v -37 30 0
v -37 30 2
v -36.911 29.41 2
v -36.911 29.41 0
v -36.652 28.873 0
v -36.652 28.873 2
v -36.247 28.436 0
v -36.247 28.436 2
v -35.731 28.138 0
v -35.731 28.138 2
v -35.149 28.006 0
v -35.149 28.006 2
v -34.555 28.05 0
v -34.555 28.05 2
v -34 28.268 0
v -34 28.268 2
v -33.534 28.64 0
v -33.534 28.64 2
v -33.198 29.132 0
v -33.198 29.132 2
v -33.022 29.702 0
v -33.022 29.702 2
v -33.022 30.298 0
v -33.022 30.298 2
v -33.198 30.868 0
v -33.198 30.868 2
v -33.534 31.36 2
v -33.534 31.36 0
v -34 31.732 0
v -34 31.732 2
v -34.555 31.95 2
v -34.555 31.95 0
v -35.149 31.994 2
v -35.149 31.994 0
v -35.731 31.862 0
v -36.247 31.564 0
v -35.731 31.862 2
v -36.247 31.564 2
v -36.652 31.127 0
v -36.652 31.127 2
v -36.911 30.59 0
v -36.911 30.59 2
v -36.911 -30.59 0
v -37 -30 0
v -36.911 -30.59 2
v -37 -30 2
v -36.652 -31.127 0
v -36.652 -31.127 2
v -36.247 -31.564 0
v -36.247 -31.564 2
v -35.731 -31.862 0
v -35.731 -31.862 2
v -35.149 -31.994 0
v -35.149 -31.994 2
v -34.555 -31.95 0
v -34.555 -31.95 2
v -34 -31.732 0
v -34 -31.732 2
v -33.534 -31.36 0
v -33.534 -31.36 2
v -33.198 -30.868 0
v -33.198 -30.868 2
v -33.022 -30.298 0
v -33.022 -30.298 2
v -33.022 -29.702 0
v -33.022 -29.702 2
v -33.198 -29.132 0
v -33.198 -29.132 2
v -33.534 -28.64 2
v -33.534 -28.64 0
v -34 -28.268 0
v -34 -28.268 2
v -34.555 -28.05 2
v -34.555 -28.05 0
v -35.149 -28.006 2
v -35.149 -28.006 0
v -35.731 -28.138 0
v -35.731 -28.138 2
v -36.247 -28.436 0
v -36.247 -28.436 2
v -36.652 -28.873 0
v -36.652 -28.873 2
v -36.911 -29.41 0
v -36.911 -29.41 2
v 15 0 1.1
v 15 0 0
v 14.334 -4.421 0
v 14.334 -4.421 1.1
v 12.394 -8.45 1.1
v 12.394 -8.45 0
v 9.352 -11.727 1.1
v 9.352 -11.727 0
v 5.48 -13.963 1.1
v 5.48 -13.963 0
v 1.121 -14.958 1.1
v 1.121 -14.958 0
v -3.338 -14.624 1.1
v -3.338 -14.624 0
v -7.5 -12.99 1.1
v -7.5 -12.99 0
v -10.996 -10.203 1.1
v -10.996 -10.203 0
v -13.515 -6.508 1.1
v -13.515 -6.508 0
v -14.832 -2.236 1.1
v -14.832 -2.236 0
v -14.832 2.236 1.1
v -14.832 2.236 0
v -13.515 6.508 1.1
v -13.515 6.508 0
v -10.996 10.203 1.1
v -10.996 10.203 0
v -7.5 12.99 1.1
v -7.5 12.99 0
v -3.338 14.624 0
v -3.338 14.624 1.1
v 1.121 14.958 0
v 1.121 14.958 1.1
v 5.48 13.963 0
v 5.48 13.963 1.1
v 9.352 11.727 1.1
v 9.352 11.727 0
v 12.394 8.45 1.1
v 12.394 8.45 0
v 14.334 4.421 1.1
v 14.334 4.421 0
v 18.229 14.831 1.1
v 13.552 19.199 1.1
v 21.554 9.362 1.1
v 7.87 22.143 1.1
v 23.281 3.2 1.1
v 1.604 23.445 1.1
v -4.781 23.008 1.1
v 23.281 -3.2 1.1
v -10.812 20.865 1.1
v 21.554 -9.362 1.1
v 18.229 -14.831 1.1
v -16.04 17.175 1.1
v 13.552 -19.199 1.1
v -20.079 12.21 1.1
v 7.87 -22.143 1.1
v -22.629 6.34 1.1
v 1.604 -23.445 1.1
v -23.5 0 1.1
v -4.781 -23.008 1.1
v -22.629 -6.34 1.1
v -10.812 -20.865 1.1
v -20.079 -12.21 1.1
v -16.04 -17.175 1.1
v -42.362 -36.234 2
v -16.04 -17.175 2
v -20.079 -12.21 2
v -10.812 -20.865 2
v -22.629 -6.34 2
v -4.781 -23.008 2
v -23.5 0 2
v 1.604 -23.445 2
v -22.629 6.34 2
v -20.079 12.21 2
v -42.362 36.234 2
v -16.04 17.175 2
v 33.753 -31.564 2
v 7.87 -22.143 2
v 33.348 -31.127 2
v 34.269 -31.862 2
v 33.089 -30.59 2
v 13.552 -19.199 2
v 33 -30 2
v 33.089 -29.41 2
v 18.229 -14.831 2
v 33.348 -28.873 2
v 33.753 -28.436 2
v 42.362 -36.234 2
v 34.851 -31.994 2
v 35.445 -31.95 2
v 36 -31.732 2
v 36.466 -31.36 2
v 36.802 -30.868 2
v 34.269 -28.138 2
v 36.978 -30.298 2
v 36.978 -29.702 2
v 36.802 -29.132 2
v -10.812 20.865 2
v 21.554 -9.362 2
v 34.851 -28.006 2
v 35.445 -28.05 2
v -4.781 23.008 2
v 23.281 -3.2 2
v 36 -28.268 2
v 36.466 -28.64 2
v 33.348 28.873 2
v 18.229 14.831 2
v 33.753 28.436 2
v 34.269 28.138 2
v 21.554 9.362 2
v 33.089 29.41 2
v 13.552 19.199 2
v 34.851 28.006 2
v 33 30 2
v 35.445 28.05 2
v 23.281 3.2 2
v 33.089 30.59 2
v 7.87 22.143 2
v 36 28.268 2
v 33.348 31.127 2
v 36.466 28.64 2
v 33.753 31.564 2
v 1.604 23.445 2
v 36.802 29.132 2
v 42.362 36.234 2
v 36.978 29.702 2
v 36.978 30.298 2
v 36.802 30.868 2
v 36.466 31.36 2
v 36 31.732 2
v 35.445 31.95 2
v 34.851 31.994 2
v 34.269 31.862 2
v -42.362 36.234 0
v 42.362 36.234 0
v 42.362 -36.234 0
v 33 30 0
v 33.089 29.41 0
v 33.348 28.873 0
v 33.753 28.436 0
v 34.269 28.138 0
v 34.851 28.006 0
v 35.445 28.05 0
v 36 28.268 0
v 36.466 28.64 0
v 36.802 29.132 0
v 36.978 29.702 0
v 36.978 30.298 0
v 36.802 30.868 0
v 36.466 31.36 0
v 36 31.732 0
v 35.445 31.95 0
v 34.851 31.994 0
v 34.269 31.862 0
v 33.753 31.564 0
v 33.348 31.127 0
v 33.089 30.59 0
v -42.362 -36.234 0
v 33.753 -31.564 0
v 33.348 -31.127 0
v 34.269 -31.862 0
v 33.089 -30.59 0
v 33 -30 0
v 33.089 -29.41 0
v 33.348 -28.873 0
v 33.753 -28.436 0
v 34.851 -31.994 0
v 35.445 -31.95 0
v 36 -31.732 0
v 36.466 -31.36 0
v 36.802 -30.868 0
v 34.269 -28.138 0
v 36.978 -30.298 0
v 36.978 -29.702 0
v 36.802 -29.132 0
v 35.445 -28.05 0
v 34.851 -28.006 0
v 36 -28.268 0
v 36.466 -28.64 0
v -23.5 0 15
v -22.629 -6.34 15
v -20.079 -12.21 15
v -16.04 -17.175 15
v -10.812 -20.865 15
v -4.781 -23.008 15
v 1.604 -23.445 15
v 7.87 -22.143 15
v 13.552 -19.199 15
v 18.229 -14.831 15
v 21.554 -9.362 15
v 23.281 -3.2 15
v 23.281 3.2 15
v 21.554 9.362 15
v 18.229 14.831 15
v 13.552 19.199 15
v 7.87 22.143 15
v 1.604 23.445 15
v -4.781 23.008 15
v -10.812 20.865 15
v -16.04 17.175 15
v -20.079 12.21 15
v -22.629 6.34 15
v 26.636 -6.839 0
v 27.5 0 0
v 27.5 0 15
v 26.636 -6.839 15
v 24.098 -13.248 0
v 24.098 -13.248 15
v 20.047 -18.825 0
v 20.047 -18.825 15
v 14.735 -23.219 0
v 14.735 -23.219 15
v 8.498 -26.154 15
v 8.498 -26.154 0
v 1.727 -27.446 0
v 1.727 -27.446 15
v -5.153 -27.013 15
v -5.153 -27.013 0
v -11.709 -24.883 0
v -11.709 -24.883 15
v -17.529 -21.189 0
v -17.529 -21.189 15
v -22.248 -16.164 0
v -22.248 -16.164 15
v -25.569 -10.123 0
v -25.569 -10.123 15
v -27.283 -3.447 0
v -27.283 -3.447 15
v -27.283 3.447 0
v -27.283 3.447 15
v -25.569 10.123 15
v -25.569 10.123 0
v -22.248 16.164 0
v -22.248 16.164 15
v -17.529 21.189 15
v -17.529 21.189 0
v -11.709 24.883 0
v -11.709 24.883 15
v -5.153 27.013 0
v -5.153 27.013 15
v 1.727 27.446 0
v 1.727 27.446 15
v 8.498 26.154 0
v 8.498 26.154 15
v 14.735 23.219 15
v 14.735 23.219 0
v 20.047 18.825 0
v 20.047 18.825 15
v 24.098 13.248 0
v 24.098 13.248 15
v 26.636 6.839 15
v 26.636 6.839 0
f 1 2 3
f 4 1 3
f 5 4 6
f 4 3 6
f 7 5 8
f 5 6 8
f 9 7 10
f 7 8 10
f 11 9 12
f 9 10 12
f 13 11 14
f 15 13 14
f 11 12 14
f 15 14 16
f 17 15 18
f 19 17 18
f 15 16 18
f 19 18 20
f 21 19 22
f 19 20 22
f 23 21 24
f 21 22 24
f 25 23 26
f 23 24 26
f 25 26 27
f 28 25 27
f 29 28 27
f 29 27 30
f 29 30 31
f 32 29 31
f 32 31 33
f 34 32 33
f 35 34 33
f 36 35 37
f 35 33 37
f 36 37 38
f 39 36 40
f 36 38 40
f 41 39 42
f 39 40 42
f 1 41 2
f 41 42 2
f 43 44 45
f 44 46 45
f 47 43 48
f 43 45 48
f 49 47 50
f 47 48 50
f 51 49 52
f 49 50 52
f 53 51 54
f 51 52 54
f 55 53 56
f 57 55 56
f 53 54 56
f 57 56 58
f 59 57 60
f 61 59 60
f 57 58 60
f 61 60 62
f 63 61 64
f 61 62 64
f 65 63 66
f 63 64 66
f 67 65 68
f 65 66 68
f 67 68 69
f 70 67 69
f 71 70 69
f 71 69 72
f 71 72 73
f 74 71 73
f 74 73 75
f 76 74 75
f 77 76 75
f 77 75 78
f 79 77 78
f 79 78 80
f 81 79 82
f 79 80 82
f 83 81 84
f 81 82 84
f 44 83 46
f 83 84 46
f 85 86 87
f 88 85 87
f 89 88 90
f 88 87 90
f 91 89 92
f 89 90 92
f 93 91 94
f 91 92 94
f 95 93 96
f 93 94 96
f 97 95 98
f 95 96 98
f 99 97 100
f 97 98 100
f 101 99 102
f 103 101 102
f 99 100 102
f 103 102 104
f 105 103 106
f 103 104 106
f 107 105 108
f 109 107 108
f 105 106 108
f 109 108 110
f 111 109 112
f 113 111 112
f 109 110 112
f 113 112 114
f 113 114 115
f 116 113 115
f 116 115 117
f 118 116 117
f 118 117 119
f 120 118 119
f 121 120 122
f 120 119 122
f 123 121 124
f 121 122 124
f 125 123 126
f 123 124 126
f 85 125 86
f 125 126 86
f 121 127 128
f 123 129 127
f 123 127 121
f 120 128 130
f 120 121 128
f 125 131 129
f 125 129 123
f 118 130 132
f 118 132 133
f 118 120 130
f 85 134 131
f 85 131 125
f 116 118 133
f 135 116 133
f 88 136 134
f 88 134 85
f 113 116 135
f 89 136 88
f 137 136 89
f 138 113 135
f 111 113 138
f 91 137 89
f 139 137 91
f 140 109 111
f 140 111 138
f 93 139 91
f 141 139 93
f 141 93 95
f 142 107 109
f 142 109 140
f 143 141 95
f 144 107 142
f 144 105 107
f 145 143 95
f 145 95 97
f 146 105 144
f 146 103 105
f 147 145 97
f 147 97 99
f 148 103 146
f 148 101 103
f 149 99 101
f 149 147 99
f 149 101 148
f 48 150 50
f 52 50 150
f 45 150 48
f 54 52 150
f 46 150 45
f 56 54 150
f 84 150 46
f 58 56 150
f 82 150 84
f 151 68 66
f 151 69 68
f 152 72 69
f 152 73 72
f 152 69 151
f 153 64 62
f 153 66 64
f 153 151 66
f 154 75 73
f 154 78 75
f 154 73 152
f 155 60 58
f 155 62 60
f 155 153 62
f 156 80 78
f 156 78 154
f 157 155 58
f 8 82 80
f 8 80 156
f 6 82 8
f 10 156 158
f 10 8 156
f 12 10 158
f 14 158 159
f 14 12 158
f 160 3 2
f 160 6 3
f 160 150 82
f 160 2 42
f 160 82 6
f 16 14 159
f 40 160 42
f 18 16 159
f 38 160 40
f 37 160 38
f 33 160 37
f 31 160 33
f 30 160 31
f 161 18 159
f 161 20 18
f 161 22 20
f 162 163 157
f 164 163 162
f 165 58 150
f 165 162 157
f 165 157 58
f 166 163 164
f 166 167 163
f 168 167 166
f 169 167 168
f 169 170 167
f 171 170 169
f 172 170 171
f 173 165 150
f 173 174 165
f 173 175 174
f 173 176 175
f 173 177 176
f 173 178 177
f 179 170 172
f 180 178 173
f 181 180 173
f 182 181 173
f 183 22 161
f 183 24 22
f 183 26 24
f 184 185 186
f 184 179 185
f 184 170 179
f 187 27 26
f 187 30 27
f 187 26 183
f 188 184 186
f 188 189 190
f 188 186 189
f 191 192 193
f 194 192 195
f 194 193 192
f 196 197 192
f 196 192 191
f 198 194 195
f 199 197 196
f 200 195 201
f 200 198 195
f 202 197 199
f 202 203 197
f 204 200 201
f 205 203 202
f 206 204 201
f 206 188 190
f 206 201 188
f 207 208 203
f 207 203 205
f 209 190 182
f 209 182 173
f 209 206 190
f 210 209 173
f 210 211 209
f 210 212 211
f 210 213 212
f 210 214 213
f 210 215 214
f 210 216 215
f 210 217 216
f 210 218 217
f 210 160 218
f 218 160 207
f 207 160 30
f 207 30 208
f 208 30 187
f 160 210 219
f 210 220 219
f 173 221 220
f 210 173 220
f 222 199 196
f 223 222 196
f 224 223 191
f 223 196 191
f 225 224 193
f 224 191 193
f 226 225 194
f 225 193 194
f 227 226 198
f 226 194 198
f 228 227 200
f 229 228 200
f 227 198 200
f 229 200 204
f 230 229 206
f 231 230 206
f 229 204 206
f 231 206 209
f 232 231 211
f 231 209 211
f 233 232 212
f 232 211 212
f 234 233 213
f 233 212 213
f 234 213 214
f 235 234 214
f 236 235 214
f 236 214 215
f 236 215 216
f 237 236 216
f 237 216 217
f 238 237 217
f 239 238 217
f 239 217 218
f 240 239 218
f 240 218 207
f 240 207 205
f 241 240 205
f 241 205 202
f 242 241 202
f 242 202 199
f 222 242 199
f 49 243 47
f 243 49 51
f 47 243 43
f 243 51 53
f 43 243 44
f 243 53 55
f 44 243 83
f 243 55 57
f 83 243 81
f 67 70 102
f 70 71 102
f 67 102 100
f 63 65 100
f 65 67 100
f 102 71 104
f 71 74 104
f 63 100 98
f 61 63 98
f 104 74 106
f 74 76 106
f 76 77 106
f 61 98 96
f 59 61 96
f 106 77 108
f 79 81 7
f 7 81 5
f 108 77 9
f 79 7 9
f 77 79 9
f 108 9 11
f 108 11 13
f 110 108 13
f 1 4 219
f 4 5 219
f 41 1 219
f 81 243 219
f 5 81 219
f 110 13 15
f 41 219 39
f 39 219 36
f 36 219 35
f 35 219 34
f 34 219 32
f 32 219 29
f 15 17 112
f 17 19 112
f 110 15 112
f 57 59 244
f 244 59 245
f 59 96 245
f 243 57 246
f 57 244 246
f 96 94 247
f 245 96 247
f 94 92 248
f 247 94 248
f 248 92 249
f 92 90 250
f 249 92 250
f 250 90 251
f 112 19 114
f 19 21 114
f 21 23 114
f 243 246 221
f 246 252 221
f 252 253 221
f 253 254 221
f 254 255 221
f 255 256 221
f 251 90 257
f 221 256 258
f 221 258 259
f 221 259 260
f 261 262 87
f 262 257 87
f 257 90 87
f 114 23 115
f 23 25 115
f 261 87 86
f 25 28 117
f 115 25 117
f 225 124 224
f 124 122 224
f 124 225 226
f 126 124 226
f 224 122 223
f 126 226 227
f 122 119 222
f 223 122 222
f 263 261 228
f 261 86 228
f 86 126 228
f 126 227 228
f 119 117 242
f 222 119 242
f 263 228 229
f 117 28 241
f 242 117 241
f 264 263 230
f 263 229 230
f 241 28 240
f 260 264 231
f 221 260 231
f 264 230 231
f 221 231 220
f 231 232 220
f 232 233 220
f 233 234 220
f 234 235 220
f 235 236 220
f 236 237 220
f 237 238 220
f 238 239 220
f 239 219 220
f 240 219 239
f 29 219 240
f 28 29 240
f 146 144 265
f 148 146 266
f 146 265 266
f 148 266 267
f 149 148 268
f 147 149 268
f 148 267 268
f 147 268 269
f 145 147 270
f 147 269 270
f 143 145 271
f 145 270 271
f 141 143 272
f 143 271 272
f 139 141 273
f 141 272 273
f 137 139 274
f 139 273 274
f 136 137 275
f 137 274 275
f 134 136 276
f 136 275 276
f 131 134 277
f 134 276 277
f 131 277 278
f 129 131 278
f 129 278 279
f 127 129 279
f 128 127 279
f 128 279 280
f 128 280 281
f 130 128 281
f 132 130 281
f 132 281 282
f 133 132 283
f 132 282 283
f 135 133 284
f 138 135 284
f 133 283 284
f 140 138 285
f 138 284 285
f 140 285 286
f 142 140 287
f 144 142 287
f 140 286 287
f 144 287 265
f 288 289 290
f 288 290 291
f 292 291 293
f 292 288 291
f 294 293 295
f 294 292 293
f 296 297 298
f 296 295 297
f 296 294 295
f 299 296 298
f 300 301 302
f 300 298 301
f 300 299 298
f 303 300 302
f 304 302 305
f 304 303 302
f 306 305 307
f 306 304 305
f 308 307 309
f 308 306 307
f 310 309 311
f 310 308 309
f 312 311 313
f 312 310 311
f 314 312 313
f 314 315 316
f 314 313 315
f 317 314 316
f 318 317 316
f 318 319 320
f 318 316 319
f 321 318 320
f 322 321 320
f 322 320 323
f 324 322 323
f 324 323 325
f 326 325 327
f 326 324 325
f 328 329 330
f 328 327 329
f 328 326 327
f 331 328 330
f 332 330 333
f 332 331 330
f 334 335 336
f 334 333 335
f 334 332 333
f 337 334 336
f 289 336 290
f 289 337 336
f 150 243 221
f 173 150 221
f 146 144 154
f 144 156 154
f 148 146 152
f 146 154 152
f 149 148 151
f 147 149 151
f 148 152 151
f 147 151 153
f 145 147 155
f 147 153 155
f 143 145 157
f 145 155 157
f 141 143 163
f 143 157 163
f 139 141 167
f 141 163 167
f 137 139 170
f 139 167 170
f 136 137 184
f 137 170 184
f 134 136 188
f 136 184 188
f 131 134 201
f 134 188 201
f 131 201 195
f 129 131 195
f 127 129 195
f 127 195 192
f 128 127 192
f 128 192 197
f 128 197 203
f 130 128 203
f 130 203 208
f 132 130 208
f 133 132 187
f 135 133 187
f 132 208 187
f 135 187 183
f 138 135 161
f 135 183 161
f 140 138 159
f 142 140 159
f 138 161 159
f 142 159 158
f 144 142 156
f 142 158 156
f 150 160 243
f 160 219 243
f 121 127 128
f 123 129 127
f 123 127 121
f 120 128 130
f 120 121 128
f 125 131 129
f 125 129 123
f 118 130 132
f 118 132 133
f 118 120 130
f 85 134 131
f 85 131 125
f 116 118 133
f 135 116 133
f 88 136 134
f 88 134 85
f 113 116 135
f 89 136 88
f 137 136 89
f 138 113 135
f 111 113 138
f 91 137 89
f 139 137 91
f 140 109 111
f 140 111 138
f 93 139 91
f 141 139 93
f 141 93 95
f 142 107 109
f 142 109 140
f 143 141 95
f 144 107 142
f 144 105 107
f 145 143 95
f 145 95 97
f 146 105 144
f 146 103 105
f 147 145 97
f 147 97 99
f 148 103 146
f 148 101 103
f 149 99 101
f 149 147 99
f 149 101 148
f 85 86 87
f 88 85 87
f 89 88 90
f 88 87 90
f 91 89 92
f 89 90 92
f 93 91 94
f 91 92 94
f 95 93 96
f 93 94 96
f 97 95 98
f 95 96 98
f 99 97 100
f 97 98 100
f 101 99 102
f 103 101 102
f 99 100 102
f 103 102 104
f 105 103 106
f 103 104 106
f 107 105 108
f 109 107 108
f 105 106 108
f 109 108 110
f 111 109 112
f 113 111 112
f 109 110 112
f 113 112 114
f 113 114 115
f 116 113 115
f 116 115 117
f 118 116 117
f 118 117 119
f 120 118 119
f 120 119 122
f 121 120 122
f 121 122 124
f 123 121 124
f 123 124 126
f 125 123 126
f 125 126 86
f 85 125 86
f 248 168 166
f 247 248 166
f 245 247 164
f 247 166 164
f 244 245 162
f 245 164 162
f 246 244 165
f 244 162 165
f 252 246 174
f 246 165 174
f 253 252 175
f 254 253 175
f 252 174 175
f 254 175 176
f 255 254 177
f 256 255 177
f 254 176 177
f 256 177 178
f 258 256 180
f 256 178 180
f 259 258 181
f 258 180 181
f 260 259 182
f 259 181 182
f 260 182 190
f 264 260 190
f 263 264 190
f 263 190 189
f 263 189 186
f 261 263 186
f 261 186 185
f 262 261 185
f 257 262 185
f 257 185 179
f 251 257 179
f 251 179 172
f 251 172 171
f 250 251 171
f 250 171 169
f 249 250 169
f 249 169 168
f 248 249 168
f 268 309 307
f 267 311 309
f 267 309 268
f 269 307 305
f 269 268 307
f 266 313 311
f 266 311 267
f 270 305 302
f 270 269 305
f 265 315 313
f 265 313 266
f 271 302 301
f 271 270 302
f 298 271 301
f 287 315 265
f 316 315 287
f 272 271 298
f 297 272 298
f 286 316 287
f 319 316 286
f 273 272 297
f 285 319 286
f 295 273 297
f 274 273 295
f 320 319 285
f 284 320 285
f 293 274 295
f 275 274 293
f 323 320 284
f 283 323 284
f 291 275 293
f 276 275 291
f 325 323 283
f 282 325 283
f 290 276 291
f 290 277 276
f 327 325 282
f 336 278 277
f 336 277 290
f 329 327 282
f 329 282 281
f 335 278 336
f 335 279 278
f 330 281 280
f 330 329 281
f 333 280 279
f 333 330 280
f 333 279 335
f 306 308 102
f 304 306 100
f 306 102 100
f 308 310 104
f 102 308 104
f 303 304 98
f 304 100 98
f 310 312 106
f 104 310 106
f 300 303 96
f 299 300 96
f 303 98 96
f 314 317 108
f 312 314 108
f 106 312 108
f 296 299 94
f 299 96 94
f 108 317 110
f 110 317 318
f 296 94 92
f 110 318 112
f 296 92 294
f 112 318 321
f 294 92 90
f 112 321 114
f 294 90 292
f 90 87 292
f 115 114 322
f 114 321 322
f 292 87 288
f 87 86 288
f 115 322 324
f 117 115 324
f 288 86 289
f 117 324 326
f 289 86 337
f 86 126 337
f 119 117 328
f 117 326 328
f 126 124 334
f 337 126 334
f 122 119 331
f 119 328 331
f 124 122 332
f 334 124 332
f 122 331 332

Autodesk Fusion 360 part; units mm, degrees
sketch "Sketch1" plane through (0, 0, 0) normal (0, 0, 1) x (1, 0, 0)
  circle A0 centre (0, 0) radius 27.5
  line L0 (42.3621, 36.2343) -> (-42.3621, 36.2343)
  line L1 (-42.3621, 36.2343) -> (-42.3621, -36.2343)
  line L2 (-42.3621, -36.2343) -> (42.3621, -36.2343)
  line L3 (42.3621, -36.2343) -> (42.3621, 36.2343)
  line L4 (42.3621, 36.2343) -> (-42.3621, -36.2343) construction
  line L5 (-42.3621, 36.2343) -> (42.3621, -36.2343) construction
  dimension "d1" = 55
extrude "Extrude1" add sketch "Sketch1" along normal blind 2 contours A0 | L0 L1 L2 L3 makes body 1
extrude "Extrude2" add sketch "Sketch1" along normal blind 15 separate body contours A0 makes body 2
sketch "Sketch2" plane through (0, 0, 15) normal (0, 0, 1) x (-1, 0, 0)
  circle A0 centre (0, 0) radius 27.5
  circle A1 centre (0, 0) radius 23.5
  dimension "d6" = 47
extrude "Extrude3" cut sketch "Sketch2" against normal blind 13.9 contours A1 bodies 1 2
sketch "Sketch3" plane through (0, 0, 2) normal (0, 0, 1) x (-1, 0, 0)
  circle A0 centre (0, 0) radius 23.5
  line L0 (-42.3621, 36.2343) -> (-42.3621, -36.2343)
  line L1 (-42.3621, -36.2343) -> (42.3621, -36.2343)
  line L2 (42.3621, -36.2343) -> (42.3621, 36.2343)
  line L3 (42.3621, 36.2343) -> (-42.3621, 36.2343)
  circle A1 centre (35, -30) radius 2
  circle A2 centre (-35, -30) radius 2
  circle A3 centre (35, 30) radius 2
  circle A4 centre (-35, 30) radius 2
  dimension "d9" = 4
  dimension "d10" = 4
  dimension "d11" = 4
  dimension "d12" = 4
extrude "Extrude4" cut sketch "Sketch3" against normal blind 2 contours A1 | A2 | A3 | A4 bodies 1
sketch "Sketch4" plane through (0, 0, 0) normal (0, 0, 1) x (1, 0, 0)
  circle A0 centre (0, 0) radius 15
  dimension "d15" = 30
extrude "Extrude5" cut sketch "Sketch4" along normal blind 12 bodies 1 2
